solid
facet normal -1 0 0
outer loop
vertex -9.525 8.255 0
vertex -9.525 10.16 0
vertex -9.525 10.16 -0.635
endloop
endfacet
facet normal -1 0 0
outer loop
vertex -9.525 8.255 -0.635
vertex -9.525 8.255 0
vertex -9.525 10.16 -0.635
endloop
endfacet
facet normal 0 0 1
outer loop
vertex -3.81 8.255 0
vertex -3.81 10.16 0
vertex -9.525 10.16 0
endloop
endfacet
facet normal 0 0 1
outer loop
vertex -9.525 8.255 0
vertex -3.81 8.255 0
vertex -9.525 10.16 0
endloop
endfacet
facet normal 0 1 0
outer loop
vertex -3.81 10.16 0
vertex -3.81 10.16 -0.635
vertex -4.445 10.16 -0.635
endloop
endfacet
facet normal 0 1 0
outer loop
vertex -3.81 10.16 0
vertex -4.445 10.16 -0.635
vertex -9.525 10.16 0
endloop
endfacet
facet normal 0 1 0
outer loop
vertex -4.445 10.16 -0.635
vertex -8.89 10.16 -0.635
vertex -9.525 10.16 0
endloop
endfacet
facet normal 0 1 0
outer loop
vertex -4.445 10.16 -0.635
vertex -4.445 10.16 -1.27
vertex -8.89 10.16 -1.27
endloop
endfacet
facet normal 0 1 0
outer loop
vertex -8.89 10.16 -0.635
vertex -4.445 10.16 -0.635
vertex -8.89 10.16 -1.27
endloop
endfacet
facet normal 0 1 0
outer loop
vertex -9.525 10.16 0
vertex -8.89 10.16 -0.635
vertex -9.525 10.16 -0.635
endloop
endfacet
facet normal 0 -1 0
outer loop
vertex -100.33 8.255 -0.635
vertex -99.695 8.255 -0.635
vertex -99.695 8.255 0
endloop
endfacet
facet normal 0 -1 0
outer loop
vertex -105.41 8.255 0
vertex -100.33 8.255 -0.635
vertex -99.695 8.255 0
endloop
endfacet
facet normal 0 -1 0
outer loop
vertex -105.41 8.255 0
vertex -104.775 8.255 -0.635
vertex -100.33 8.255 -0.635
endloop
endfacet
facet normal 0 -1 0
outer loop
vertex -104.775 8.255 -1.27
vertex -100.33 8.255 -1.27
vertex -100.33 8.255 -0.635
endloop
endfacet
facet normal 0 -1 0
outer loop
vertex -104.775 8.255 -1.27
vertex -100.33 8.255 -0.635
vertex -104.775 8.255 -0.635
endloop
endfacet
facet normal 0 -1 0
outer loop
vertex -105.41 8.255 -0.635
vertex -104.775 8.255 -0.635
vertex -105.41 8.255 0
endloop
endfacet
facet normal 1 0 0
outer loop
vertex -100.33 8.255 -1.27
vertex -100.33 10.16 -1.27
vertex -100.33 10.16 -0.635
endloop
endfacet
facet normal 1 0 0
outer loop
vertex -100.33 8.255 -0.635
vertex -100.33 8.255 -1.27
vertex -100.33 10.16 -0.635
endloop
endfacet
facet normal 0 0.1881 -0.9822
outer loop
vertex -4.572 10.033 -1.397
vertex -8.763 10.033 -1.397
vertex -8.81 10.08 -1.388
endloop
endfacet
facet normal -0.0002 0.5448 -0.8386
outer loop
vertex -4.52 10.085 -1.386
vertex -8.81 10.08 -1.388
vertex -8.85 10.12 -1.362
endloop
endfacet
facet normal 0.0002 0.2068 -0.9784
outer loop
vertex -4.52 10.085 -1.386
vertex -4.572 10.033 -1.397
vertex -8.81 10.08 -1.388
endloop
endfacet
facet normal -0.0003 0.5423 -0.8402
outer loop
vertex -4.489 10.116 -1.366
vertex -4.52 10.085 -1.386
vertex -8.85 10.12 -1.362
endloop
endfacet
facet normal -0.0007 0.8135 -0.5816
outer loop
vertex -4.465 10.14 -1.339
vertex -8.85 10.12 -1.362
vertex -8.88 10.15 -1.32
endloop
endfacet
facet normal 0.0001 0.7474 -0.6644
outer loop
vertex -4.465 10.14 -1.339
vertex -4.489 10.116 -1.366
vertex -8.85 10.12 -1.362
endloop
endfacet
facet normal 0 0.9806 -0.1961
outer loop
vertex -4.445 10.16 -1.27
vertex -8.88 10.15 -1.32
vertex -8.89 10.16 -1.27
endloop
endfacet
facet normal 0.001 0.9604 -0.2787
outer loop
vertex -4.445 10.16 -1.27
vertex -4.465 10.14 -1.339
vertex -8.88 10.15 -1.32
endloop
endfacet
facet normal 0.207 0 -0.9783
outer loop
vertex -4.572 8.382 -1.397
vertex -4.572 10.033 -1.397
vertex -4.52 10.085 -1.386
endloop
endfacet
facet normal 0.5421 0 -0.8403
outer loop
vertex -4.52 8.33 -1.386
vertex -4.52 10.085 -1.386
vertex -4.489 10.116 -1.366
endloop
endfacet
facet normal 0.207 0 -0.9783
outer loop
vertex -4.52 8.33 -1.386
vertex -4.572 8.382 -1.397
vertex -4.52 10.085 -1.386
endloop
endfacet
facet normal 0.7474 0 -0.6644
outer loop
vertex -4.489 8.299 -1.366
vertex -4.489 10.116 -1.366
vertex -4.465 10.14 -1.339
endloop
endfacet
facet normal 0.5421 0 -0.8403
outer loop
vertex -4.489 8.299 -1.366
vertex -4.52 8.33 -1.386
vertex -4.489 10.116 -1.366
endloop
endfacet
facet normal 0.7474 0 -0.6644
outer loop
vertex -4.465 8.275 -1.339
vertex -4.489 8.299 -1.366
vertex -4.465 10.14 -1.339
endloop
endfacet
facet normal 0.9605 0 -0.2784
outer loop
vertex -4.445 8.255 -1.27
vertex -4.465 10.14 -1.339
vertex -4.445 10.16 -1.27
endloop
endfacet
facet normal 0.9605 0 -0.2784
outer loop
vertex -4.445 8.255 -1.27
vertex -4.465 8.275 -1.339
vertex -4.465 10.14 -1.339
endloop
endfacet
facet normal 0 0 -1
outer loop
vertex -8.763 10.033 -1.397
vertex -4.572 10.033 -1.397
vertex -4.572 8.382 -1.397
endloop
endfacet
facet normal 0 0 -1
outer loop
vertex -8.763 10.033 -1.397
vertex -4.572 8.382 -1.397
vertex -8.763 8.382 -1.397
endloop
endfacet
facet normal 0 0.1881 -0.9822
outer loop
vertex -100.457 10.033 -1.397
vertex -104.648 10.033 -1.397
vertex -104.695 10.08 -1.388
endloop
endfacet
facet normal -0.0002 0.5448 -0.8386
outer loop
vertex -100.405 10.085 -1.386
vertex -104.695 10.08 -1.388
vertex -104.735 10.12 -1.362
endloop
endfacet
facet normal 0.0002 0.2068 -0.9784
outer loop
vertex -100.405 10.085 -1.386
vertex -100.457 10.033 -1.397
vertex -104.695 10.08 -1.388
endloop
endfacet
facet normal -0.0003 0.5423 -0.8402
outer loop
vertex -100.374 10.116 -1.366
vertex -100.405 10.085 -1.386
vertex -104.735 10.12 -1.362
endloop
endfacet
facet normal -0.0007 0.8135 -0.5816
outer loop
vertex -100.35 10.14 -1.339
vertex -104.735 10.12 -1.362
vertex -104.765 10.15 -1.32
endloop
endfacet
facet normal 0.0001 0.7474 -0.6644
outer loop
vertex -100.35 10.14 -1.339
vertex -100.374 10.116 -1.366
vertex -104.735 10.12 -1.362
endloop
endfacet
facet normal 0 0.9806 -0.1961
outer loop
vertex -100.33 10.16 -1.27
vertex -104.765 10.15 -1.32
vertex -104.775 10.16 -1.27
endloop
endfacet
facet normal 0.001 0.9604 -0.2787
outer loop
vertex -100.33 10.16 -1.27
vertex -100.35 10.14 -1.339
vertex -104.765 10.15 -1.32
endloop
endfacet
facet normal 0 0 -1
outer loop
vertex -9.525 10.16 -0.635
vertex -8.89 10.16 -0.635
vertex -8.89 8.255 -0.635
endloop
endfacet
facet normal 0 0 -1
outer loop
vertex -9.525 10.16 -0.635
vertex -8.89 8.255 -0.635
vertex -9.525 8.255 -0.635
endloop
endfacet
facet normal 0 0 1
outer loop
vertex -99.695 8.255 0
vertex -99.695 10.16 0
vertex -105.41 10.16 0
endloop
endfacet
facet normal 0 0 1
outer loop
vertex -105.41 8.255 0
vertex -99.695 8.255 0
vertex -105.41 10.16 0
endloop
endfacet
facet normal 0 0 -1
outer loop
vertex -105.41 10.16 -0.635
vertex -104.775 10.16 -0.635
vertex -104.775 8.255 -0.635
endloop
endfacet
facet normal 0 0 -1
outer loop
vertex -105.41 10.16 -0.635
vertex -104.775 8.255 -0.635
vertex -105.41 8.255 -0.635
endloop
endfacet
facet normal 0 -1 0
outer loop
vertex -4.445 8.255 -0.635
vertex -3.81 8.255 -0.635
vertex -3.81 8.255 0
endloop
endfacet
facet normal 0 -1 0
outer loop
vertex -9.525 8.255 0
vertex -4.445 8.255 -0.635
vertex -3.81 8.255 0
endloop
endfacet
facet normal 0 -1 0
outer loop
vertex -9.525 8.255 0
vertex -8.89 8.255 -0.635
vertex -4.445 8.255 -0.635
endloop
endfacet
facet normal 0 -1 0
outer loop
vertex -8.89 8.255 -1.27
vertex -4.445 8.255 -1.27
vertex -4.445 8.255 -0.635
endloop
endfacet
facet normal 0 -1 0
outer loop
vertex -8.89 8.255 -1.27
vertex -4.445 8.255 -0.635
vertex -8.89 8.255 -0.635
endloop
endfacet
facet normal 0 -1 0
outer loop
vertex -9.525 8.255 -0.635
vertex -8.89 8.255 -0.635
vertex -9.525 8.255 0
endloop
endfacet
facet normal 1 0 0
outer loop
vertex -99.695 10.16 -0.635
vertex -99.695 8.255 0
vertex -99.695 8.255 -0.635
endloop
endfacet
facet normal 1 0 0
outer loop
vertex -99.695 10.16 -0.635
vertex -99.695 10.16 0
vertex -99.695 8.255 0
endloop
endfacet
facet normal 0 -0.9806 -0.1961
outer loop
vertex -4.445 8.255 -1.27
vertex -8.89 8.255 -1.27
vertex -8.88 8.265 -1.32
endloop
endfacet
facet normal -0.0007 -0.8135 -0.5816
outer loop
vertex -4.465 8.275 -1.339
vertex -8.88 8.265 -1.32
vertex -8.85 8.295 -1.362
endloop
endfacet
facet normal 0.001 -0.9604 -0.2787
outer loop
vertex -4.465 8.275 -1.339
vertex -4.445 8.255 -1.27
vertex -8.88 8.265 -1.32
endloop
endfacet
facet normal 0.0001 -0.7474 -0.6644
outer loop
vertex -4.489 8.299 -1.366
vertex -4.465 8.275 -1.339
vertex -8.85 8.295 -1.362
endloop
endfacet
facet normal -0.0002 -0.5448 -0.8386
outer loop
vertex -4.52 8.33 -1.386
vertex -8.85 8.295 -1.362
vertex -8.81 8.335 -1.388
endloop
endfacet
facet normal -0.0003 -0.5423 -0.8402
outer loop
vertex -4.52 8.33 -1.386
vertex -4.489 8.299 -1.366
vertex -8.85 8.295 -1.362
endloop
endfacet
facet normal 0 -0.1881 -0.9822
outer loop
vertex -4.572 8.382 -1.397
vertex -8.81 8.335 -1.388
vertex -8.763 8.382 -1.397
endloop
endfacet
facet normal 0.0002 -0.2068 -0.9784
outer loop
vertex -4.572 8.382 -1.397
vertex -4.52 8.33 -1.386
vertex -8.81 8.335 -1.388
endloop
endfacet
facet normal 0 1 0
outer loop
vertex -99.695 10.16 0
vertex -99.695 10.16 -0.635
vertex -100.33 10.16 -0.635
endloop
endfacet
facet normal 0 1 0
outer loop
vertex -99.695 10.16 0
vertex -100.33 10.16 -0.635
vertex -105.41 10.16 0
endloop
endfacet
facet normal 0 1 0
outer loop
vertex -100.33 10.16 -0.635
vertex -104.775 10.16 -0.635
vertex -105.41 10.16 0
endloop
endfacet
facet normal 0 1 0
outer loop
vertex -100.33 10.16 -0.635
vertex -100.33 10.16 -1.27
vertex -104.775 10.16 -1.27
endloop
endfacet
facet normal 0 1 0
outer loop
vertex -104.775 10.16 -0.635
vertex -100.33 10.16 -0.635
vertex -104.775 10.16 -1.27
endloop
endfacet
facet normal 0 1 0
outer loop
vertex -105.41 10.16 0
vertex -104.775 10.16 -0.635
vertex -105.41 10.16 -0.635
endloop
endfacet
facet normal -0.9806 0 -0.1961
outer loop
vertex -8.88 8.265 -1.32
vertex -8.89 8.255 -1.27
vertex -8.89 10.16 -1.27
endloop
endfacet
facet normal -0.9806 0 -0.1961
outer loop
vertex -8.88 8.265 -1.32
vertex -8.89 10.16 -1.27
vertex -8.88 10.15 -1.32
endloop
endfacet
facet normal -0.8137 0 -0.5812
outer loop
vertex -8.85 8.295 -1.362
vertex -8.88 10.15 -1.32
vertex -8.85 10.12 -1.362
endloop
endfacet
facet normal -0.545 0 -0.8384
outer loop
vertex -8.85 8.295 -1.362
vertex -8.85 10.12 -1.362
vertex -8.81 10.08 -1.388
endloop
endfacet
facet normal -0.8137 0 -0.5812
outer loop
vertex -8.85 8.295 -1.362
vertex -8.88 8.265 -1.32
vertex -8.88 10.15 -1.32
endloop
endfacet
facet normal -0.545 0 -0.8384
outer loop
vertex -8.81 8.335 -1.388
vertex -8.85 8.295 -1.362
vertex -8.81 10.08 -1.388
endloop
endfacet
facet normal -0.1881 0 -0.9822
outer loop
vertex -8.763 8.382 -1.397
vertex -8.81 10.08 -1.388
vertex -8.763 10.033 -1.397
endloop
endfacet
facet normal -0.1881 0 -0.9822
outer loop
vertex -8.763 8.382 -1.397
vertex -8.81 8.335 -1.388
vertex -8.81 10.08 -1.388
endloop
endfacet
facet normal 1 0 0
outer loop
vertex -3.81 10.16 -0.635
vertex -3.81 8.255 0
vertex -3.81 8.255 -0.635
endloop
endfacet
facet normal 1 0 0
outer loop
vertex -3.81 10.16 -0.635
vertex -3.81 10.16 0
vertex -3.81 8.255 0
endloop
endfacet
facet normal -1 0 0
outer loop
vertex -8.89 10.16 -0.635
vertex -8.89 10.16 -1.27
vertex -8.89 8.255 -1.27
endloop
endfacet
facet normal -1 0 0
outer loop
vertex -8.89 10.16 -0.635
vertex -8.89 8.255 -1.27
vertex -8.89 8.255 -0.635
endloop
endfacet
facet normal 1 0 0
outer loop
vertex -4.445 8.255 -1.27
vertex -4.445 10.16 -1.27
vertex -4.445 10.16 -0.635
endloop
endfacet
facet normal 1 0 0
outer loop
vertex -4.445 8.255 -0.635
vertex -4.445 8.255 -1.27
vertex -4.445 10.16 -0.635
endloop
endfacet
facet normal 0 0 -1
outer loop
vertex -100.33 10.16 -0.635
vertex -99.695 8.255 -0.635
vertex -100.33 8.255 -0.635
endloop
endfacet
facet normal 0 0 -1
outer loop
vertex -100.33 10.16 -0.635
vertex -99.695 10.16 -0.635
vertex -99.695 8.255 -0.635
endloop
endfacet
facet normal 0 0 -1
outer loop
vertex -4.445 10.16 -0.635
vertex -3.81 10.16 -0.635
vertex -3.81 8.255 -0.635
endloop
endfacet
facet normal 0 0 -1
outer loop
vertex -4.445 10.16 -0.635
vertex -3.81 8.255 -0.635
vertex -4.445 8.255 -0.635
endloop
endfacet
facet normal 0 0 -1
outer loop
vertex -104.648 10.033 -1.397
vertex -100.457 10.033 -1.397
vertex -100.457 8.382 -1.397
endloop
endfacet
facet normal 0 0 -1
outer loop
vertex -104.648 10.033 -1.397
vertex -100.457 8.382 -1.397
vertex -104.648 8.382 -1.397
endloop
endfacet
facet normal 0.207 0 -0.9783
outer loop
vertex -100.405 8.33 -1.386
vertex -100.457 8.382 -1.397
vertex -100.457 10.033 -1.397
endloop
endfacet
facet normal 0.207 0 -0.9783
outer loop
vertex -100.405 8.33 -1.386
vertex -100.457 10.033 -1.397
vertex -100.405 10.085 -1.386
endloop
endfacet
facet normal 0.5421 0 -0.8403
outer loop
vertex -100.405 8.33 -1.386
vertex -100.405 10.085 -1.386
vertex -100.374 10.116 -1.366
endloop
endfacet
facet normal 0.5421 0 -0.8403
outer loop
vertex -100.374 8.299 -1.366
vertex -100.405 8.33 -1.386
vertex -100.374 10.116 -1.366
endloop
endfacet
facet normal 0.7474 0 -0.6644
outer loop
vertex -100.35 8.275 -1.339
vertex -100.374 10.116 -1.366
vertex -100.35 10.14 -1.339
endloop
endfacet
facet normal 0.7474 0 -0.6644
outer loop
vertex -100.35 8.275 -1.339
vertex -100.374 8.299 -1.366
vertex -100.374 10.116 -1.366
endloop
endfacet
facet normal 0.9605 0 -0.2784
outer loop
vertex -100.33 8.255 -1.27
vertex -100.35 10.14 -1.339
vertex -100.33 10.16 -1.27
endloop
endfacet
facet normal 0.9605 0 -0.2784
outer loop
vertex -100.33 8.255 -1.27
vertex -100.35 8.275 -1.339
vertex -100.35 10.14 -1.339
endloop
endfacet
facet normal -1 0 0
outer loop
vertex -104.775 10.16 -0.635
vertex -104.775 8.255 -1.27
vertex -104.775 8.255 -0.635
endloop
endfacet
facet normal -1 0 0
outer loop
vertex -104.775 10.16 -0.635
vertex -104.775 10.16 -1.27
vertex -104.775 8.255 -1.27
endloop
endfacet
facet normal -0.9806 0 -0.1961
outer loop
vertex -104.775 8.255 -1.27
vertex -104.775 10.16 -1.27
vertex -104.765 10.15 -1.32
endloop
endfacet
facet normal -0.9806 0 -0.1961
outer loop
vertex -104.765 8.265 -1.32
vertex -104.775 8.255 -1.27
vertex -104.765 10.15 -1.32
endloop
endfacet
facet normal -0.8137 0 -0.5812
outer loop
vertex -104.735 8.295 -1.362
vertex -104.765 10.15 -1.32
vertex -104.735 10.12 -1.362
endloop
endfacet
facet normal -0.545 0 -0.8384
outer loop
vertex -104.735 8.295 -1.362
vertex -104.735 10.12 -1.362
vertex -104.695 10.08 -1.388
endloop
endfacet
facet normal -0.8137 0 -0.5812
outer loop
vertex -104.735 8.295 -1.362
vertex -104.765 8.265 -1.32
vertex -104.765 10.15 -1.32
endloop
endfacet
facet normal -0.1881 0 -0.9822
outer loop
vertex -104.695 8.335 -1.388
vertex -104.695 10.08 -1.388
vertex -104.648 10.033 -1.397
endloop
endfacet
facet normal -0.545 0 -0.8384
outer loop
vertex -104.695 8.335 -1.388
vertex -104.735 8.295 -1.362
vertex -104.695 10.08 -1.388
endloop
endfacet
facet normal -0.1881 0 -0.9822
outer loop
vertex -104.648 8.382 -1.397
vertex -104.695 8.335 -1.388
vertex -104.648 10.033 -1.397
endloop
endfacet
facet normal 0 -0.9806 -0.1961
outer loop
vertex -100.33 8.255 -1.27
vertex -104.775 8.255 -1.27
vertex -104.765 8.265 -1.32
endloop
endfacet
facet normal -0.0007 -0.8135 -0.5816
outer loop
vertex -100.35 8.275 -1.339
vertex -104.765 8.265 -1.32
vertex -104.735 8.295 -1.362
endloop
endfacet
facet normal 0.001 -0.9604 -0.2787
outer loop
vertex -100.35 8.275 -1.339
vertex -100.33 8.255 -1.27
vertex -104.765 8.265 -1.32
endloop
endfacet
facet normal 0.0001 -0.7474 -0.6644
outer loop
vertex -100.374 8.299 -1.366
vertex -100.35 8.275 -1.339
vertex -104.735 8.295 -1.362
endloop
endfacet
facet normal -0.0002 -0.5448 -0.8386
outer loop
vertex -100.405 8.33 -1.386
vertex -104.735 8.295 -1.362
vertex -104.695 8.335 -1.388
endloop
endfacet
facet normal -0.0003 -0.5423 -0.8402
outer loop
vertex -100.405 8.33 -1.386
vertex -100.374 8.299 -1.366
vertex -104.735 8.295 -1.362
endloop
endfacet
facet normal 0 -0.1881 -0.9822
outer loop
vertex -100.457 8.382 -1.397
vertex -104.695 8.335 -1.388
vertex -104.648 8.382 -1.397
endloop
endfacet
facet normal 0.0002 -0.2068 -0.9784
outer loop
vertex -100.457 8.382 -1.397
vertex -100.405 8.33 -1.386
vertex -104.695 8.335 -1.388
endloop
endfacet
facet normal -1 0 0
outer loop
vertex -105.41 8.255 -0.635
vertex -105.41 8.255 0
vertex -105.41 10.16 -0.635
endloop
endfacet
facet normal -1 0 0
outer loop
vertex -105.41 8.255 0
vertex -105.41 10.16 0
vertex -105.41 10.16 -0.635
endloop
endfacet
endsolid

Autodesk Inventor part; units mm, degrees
ref_plane "YZ Plane" through (0, 0, 0) normal (1, 0, 0) x (0, 1, 0)
ref_plane "Work Plane1" through (0, 10.16, -2.54) normal (0, -1, 0) x (-1, 0, 0)
ref_plane "Work Plane2" through (-110.49, 8.255, -2.54) normal (0, 1, 0) x (0, 0, 1)
sketch "Sketch2" plane through (0, 10.16, -2.54) normal (0, -1, 0) x (-1, 0, 0)
  line L0 (4.445, -1.27) -> (4.445, -1.905)
  line L1 (3.81, -1.905) -> (4.445, -1.905)
  line L2 (3.81, -2.54) -> (3.81, -1.905)
  line L3 (3.81, -2.54) -> (9.525, -2.54)
  line L4 (9.525, -2.54) -> (9.525, -1.905)
  line L5 (8.89, -1.905) -> (9.525, -1.905)
  line L6 (8.89, -1.27) -> (8.89, -1.905)
  line L7 (8.89, -1.27) -> (4.445, -1.27)
  point P0 (0, -2.54)
extrude "Extrusion1" add sketch "Sketch2" along normal up to surface (1.905 mm away)
sketch "Sketch3" plane through (-4.445, 10.16, -1.27) normal (0, 0, -1) x (-1, 0, 0)
  line L0 (4.445, -1.905) -> (0, -1.905) projected
  line L1 (4.445, 0) -> (4.445, -1.905) projected
  line L2 (4.445, 0) -> (0, 0) projected
  line L3 (0, 0) -> (0, -1.905) projected
  point P0 (-4.445, -10.16)
extrude "Extrusion2" add sketch "Sketch3" along normal blind 0.127
ref_plane "Work Plane3" through (-110.49, 8.255, -2.54) normal (0, 1, 0) x (0, 0, 1)
sketch "Sketch5" plane through (0, 10.16, -2.54) normal (0, -1, 0) x (-1, 0, 0)
  line L0 (100.33, -1.27) -> (100.33, -1.905)
  line L1 (99.695, -1.905) -> (100.33, -1.905)
  line L2 (99.695, -2.54) -> (99.695, -1.905)
  line L3 (99.695, -2.54) -> (105.41, -2.54)
  line L4 (105.41, -2.54) -> (105.41, -1.905)
  line L5 (104.775, -1.905) -> (105.41, -1.905)
  line L6 (104.775, -1.27) -> (104.775, -1.905)
  line L7 (104.775, -1.27) -> (100.33, -1.27)
  point P0 (0, -2.54)
extrude "Extrusion3" add sketch "Sketch5" along normal up to surface (1.905 mm away) separate body
sketch "Sketch6" plane through (-100.33, 10.16, -1.27) normal (0, 0, -1) x (-1, 0, 0)
  line L0 (4.445, -1.905) -> (0, -1.905) projected
  line L1 (4.445, 0) -> (4.445, -1.905) projected
  line L2 (4.445, 0) -> (0, 0) projected
  line L3 (0, 0) -> (0, -1.905) projected
  point P0 (-100.33, -10.16)
extrude "Extrusion4" add sketch "Sketch6" along normal blind 0.127 bodies 2
fillet "Fillet1" radius 0.127 4 edges at (-4.445, 9.2075, -1.397) (-8.89, 9.2075, -1.397) (-6.6675, 8.255, -1.397) (-6.6675, 10.16, -1.397)
fillet "Fillet2" radius 0.127 4 edges at (-100.33, 9.2075, -1.397) (-102.5525, 10.16, -1.397) (-104.775, 9.2075, -1.397) (-102.5525, 8.255, -1.397)
properties part number "LedCovers"
